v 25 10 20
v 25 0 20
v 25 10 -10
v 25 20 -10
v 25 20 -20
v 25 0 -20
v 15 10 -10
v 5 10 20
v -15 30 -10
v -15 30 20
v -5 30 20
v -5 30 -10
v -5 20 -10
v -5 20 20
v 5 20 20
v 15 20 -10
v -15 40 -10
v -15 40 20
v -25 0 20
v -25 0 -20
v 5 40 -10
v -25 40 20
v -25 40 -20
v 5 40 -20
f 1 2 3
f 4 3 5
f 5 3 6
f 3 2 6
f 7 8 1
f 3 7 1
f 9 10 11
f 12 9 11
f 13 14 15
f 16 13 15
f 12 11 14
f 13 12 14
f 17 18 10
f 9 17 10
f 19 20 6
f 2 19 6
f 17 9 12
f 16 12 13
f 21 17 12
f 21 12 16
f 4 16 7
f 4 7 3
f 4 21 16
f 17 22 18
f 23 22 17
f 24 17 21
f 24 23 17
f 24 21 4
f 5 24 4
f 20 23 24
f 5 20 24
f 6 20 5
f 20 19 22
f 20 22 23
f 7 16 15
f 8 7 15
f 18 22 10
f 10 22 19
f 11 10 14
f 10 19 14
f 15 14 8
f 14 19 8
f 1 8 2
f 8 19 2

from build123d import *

# Parameters (mm, degrees)
SKETCH1_W           = 50
SKETCH1_H           = 40
BOSS_EXTRUDE1_DEPTH = 40
CUT_EXTRUDE1_DEPTH  = 30
CUT_EXTRUDE2_DEPTH  = 10
CUT_EXTRUDE3_DEPTH  = 10


with BuildPart() as part:
    # Sketch1 → Boss-Extrude1 (new body)
    with BuildSketch(Plane(origin=(0, 0, 0), x_dir=(1, 0, 0), z_dir=(0, 1, 0))):
        Rectangle(SKETCH1_W, SKETCH1_H)
    extrude(amount=BOSS_EXTRUDE1_DEPTH)

    # Sketch3 → Cut-Extrude1 (cut)
    with BuildSketch(Plane.XY.offset(20)):
        Polygon((-15, 40), (-15, 30), (-5, 30), (-5, 20), (25, 20), (25, 40), align=None)
    extrude(amount=-CUT_EXTRUDE1_DEPTH, mode=Mode.SUBTRACT)

    # Sketch4 → Cut-Extrude2 (cut)
    with BuildSketch(Plane(origin=(0, 20, 0), x_dir=(1, 0, 0), z_dir=(0, 1, 0))):
        Polygon((15, 10), (5, -20), (25, -20), (25, 10), align=None)
    extrude(amount=-CUT_EXTRUDE2_DEPTH, mode=Mode.SUBTRACT)

    # Sketch5 → Cut-Extrude3 (cut)
    with BuildSketch(Plane.XY.offset(-10)):
        Polygon((5, 40), (25, 20), (25, 40), align=None)
    extrude(amount=-CUT_EXTRUDE3_DEPTH, mode=Mode.SUBTRACT)


solid = part.part
